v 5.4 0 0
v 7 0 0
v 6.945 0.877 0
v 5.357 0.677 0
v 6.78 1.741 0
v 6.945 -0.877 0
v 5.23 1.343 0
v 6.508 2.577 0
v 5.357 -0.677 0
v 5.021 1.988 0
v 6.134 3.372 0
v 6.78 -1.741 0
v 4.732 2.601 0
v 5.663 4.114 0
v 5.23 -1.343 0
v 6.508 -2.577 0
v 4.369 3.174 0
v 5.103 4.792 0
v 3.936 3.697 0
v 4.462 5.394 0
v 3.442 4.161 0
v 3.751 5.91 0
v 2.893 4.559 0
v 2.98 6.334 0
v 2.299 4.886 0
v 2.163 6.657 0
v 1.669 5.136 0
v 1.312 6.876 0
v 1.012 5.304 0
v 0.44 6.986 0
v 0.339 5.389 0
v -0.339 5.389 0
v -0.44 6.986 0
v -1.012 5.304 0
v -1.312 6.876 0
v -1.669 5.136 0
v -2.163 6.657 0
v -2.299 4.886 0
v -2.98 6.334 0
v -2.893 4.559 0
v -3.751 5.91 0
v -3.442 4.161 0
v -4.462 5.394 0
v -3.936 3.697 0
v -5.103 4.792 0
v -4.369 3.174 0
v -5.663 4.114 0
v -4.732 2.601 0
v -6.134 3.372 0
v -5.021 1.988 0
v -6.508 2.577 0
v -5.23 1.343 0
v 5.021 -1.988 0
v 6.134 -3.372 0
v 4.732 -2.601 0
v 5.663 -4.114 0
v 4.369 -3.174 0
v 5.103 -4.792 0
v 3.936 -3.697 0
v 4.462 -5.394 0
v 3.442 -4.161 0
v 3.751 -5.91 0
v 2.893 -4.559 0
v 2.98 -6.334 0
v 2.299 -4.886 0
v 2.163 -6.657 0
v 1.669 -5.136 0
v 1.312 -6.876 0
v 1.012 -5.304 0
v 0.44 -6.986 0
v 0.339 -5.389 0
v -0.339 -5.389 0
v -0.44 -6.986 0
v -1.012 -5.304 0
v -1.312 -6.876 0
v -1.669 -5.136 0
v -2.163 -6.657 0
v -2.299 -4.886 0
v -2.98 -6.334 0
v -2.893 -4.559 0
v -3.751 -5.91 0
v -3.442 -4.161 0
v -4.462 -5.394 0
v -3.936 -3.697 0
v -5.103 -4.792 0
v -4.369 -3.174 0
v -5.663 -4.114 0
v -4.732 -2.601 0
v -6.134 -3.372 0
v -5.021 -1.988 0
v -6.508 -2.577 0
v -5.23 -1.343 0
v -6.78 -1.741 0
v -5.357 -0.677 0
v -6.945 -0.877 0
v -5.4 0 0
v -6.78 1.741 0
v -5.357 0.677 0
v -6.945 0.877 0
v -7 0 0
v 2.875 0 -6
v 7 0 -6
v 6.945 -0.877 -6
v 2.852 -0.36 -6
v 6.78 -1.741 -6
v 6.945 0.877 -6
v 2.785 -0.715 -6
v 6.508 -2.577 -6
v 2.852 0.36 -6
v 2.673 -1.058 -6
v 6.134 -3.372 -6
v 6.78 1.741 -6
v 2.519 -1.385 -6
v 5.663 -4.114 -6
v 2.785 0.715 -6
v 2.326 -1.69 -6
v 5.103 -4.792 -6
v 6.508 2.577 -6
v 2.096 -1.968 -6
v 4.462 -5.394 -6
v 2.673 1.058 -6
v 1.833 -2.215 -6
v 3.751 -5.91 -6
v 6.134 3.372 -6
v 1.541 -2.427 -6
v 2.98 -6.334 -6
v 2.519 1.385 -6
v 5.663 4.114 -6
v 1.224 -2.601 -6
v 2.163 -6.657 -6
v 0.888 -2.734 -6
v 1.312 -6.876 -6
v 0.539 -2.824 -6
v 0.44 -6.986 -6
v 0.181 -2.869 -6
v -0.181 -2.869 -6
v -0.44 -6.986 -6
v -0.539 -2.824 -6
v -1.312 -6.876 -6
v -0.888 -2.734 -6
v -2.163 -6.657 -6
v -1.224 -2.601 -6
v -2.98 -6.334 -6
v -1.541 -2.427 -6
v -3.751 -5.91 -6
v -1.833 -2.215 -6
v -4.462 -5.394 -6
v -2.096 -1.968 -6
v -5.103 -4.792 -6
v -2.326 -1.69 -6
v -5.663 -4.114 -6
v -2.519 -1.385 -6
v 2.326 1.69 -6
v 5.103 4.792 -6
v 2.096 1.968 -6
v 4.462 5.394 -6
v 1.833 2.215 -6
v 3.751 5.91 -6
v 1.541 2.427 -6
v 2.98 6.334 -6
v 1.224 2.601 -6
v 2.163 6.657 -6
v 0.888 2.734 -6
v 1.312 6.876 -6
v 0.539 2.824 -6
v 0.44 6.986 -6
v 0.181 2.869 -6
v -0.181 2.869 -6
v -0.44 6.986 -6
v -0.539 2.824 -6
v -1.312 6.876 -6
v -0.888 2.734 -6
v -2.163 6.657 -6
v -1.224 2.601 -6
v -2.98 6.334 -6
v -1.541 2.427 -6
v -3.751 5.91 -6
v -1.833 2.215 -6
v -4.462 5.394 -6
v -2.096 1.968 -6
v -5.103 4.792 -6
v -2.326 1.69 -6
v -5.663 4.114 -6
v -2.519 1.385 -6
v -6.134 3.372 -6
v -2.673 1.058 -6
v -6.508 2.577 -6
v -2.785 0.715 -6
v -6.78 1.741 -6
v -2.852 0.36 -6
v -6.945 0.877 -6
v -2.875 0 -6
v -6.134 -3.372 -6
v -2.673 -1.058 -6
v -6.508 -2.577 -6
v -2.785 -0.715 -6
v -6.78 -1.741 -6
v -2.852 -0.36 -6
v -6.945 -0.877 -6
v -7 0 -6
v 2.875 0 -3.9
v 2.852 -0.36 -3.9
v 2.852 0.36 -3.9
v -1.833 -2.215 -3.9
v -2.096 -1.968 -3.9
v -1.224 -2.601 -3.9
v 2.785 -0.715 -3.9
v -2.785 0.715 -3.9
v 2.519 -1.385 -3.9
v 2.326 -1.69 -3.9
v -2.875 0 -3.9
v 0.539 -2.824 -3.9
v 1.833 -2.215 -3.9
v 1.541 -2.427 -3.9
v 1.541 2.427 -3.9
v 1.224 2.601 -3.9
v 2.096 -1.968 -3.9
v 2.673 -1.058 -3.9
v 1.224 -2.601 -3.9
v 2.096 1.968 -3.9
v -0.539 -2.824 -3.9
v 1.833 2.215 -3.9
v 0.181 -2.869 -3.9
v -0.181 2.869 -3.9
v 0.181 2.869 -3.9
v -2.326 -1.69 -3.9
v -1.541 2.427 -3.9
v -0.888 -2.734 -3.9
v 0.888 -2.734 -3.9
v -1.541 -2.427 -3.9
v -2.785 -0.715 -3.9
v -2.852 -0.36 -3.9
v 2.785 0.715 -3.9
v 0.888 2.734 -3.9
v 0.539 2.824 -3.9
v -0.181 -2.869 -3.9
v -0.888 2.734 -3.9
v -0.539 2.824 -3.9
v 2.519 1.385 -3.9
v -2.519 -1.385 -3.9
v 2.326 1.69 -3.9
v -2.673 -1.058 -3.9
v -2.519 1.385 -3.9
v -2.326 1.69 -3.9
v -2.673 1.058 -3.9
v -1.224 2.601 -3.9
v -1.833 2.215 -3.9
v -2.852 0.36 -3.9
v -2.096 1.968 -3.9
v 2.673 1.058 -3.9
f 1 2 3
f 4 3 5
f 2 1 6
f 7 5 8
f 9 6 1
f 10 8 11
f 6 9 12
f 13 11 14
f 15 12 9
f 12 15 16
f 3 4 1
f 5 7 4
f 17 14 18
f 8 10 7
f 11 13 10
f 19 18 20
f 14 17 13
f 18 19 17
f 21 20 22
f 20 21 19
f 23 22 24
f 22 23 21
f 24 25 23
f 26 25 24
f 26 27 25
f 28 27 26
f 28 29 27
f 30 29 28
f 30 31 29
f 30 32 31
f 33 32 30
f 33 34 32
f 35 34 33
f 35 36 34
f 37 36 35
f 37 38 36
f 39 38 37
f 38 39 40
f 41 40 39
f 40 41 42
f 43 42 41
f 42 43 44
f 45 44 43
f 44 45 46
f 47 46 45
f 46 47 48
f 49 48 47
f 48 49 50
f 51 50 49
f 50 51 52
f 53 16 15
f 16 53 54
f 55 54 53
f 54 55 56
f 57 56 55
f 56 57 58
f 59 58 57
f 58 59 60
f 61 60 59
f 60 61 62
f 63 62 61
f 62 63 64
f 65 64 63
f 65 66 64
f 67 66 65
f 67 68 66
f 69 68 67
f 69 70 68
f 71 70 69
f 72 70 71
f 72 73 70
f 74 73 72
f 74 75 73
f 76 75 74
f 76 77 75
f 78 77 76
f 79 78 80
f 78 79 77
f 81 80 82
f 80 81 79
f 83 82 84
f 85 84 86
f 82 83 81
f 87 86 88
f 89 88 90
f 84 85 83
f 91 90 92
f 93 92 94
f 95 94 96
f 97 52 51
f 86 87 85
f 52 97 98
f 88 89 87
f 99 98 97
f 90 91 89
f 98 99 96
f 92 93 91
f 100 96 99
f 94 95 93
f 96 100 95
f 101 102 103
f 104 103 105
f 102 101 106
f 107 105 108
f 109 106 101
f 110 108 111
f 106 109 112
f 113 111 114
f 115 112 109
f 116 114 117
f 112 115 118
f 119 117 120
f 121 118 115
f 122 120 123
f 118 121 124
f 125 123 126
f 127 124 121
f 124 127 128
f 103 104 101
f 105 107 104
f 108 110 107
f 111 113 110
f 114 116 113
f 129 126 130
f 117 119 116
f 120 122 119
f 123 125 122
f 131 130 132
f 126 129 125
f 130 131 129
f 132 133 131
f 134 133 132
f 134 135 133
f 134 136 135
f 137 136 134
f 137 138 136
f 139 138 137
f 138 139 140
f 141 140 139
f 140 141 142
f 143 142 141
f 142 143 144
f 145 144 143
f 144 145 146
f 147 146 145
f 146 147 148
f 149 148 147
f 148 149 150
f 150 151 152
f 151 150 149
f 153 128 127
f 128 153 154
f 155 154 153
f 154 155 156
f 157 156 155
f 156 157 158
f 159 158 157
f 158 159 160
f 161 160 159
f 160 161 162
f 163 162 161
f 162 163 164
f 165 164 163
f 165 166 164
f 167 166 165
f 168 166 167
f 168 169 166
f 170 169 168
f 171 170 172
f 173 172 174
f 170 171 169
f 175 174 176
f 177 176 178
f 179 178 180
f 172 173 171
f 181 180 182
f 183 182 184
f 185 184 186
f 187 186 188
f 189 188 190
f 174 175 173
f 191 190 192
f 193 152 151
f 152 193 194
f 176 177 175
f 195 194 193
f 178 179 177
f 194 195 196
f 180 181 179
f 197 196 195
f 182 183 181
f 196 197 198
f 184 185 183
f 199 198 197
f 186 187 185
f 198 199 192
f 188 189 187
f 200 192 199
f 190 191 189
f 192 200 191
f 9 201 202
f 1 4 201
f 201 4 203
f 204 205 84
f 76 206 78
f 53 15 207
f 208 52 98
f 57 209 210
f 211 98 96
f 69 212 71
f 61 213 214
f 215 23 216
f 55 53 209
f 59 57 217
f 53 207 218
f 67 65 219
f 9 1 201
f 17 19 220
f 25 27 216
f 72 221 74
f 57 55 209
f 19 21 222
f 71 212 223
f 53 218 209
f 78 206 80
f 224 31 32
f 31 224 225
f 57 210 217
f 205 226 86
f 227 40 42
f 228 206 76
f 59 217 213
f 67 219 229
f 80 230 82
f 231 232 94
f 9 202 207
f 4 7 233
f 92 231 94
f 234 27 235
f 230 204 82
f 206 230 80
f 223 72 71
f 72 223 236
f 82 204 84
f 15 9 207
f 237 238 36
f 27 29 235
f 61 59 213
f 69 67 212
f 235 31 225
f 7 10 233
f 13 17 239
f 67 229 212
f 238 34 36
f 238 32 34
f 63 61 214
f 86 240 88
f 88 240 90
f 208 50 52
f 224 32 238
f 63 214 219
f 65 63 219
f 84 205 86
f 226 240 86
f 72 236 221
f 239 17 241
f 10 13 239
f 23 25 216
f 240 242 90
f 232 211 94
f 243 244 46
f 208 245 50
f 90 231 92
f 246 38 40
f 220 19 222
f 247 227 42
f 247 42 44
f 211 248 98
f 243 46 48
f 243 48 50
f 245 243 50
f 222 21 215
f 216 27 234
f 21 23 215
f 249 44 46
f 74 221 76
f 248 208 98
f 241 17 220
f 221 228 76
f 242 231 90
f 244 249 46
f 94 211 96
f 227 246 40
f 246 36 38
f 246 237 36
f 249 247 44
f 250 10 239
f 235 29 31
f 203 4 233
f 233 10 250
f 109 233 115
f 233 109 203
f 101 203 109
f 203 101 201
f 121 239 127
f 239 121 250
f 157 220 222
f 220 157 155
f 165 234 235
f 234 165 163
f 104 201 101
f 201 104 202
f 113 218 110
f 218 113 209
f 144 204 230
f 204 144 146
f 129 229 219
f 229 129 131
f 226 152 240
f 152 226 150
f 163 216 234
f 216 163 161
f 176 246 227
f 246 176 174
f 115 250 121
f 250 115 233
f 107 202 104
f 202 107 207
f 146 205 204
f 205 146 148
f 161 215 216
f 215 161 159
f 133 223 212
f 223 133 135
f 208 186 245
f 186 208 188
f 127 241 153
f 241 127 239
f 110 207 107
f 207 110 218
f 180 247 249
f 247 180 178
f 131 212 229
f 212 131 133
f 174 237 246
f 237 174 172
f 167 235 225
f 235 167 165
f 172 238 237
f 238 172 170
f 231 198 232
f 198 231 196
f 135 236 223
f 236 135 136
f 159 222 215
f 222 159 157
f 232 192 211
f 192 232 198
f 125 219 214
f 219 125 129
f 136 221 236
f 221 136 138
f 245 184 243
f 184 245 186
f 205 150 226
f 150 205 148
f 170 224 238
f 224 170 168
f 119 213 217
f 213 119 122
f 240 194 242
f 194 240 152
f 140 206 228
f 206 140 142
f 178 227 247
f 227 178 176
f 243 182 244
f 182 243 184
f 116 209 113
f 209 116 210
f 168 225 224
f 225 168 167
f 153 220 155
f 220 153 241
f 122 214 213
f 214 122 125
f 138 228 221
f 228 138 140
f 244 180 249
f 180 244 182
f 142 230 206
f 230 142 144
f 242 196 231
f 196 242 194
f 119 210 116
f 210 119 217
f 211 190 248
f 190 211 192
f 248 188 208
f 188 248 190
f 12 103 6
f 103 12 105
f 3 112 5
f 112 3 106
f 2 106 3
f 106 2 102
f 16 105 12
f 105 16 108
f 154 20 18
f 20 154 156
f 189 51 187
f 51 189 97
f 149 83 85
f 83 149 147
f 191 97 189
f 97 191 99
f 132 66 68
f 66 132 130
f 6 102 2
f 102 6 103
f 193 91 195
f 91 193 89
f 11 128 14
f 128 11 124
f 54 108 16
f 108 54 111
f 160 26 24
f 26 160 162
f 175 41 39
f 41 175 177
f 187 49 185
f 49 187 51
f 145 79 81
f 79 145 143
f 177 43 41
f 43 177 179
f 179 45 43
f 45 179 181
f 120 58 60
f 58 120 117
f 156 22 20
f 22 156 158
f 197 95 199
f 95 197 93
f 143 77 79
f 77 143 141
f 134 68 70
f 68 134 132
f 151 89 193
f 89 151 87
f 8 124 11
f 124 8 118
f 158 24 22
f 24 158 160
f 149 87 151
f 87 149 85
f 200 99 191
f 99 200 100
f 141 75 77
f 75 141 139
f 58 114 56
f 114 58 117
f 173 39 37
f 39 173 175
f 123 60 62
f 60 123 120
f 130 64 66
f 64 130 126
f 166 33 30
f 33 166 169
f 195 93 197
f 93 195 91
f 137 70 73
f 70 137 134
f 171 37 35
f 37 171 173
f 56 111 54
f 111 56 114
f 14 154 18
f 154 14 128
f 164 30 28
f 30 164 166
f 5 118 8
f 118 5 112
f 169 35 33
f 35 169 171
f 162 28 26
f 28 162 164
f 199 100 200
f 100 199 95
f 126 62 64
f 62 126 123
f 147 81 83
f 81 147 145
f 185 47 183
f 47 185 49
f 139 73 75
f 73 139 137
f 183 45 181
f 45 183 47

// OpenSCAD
$fn = 50;


difference() {
	union() {
		translate(v = [0, 0, -6.0000000000]) {
			cylinder(h = 6, r = 7.0000000000);
		}
	}
	union() {
		translate(v = [0, 0, 0]) {
			rotate(a = [0, 0, 0]) {
				difference() {
					union() {
						translate(v = [0, 0, -6.0000000000]) {
							cylinder(h = 6, r = 2.6000000000);
						}
						translate(v = [0, 0, -3.9000000000]) {
							cylinder(h = 3.9000000000, r1 = 2.8750000000, r2 = 5.4000000000);
						}
						translate(v = [0, 0, -6.0000000000]) {
							cylinder(h = 6, r = 2.8750000000);
						}
						translate(v = [0, 0, -6.0000000000]) {
							cylinder(h = 6, r = 2.6000000000);
						}
					}
					union();
				}
			}
		}
	}
}
